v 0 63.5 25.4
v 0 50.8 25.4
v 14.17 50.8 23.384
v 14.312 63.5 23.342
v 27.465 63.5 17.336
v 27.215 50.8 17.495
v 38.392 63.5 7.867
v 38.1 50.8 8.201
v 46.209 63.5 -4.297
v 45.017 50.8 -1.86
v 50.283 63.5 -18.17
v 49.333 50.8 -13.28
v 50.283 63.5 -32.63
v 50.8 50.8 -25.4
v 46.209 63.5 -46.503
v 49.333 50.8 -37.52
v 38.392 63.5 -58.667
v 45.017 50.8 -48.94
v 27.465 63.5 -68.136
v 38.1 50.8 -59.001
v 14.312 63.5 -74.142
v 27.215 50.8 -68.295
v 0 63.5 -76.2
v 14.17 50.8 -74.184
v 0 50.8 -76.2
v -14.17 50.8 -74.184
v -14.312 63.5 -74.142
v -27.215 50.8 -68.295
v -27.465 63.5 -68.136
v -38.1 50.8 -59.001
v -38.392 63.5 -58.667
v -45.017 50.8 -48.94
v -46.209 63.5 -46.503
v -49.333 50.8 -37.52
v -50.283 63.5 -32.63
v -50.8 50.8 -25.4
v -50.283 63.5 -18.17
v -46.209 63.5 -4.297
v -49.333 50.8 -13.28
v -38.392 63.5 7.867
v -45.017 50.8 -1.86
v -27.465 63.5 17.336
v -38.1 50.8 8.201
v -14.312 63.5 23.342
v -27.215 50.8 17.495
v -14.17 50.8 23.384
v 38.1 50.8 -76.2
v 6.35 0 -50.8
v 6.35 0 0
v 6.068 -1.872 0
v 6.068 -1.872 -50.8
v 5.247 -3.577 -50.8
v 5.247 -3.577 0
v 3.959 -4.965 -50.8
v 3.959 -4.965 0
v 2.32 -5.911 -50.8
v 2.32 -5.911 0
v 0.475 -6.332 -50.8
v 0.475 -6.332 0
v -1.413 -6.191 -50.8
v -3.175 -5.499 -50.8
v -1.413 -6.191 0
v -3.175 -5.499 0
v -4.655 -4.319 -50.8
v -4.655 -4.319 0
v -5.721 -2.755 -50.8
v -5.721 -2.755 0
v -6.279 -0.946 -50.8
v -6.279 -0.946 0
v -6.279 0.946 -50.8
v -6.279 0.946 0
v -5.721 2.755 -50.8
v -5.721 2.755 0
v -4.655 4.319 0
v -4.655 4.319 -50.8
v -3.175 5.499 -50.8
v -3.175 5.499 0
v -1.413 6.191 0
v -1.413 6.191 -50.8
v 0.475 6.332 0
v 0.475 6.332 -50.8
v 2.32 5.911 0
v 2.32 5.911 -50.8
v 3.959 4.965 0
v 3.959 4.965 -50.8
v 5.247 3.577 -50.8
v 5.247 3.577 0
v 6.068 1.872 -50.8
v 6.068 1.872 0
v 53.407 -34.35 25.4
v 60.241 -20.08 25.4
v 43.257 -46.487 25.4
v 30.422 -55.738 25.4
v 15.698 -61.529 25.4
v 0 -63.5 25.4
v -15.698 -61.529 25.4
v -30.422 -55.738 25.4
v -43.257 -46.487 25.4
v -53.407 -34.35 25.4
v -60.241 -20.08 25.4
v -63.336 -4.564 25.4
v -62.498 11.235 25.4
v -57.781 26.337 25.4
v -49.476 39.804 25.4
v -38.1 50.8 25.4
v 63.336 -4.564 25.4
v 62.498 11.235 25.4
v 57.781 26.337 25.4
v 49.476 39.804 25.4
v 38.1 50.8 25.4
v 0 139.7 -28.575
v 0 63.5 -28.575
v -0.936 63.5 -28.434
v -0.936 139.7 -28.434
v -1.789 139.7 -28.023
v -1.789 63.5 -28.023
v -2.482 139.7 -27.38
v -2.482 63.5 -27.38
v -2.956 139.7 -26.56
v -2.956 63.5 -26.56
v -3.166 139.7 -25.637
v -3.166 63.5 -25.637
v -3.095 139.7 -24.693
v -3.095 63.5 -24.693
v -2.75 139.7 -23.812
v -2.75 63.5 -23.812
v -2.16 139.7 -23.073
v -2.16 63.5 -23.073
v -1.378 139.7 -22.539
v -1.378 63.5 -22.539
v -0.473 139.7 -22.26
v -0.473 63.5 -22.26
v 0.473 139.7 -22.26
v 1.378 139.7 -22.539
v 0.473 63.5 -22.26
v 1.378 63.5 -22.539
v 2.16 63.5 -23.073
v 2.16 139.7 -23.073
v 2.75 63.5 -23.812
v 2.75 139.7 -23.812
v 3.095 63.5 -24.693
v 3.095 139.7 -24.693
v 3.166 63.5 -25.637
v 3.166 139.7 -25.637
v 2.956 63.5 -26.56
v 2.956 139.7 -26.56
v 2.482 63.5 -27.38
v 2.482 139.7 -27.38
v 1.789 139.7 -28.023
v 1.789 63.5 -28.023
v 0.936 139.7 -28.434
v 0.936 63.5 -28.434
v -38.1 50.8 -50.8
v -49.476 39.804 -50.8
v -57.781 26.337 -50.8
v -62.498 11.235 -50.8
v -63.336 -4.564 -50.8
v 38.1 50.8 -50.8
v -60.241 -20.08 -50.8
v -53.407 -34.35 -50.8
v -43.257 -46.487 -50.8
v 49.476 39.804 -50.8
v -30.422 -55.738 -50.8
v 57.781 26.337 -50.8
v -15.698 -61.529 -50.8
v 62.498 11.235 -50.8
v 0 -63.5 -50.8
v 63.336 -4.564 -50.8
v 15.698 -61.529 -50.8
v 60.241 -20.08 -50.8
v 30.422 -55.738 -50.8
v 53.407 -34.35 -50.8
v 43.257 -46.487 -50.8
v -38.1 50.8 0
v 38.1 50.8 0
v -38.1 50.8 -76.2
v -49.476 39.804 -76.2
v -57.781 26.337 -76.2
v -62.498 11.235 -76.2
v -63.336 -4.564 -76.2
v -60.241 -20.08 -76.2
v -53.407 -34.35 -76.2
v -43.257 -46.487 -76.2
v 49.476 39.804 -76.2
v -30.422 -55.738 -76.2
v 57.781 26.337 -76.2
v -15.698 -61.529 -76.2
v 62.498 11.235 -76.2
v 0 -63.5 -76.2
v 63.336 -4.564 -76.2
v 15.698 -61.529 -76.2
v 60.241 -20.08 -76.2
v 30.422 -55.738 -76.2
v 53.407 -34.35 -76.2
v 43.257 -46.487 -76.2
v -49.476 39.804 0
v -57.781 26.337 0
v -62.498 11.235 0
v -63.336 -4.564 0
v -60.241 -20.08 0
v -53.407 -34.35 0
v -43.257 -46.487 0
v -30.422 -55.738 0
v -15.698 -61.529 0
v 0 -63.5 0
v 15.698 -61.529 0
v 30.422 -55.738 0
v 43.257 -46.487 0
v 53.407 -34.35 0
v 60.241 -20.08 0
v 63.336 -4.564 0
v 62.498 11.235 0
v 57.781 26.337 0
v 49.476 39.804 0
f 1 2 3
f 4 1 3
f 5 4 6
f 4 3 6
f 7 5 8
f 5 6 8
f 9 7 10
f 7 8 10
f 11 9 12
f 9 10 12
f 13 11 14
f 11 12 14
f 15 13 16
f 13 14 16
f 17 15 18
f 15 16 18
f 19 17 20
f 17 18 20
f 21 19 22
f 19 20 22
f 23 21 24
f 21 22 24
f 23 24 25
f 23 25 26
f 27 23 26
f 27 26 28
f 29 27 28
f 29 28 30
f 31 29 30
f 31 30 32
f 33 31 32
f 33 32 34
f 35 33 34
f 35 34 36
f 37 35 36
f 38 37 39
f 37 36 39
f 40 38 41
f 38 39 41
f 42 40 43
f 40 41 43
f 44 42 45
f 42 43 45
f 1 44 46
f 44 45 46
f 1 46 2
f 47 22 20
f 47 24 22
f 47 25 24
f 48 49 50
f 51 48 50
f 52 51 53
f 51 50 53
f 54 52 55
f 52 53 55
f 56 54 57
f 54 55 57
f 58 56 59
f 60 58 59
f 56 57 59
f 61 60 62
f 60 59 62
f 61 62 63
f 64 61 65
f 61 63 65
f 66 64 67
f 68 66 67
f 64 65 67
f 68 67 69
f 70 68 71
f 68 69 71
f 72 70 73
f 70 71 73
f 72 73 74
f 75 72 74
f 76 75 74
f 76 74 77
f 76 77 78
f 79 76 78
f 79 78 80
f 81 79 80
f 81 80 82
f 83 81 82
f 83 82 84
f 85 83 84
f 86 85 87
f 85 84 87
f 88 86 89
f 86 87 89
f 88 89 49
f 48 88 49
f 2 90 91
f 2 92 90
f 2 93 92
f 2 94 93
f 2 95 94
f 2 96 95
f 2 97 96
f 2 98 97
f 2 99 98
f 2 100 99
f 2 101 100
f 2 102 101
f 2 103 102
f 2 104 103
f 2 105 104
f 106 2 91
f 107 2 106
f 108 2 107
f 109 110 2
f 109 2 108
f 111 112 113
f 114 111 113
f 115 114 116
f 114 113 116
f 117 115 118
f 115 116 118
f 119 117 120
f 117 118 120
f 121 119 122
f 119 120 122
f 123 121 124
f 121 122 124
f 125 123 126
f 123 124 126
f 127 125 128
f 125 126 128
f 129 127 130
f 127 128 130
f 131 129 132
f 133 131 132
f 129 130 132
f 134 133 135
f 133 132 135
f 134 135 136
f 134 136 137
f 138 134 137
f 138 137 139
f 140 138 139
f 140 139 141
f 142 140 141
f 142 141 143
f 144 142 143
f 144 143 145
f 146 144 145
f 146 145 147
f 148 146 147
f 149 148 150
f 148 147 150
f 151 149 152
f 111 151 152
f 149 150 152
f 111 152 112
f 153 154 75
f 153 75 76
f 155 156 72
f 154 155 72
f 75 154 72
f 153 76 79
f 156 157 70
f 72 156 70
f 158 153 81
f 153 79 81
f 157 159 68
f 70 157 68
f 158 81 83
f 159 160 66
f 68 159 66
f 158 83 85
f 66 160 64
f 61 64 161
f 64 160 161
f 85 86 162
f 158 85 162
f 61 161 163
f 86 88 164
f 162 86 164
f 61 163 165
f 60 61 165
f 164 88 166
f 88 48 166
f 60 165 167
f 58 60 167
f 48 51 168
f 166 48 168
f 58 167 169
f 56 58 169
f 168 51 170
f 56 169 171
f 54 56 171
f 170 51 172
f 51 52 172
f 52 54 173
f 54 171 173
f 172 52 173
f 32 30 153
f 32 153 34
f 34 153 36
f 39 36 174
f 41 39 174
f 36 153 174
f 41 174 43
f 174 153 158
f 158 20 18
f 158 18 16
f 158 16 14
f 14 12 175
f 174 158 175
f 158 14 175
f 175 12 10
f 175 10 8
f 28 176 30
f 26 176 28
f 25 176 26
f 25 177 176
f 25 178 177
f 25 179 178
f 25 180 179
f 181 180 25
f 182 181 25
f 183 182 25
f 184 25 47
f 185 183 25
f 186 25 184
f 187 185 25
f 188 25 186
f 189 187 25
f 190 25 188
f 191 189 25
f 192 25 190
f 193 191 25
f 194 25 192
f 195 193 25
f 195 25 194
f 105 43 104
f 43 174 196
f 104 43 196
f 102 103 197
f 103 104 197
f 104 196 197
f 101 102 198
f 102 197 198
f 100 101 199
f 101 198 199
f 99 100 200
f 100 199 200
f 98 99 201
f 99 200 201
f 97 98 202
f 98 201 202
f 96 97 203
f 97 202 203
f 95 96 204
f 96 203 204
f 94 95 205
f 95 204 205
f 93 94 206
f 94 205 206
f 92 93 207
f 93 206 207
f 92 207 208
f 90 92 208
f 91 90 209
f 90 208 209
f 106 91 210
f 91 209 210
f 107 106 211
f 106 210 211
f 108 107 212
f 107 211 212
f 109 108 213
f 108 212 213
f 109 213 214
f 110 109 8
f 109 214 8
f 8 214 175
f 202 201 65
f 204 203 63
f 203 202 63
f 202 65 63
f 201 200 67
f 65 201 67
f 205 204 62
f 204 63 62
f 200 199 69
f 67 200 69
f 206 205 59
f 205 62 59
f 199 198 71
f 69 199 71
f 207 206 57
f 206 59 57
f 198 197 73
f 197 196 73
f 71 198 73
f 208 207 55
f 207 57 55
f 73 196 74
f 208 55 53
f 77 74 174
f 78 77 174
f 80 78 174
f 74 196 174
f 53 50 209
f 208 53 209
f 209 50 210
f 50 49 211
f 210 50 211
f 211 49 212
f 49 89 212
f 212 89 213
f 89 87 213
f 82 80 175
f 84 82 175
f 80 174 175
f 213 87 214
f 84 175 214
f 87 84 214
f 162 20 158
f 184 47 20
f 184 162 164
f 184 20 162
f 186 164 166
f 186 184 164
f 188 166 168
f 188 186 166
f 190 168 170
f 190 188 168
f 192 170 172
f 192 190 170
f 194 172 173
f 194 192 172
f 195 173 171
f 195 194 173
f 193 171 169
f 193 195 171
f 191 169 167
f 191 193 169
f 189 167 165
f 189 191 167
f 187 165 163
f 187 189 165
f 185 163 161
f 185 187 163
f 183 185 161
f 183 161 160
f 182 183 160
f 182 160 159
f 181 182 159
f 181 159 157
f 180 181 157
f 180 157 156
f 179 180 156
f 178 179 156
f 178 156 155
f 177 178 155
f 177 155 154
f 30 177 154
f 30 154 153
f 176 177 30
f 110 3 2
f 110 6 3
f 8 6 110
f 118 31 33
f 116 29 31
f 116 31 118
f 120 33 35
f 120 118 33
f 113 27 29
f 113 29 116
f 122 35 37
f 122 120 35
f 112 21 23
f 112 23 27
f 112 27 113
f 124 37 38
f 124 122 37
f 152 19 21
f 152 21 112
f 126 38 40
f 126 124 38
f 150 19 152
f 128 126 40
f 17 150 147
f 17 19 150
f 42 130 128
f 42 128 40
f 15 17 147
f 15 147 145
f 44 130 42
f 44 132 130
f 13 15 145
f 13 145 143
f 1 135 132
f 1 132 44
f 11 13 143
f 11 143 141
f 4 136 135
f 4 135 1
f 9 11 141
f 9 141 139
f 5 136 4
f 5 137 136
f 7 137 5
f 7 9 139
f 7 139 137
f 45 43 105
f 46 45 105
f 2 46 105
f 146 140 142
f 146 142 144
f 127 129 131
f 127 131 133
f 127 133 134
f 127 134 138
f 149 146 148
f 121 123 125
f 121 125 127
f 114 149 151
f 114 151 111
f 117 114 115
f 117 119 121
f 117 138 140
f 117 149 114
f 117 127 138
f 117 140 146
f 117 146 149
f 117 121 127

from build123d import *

# Parameters (mm, degrees)
SKETCH2_R           = 63.5
BOSS_EXTRUDE1_DEPTH = 25.4
SKETCH3_R           = 6.35
BOSS_EXTRUDE2_DEPTH = 50.8
BOSS_EXTRUDE3_START = 25.4
SKETCH4_R           = 63.5
BOSS_EXTRUDE3_DEPTH = 25.4
CUT_EXTRUDE1_START  = 76.2
SKETCH5_W           = 127
SKETCH5_H           = 101.6
CUT_EXTRUDE1_DEPTH  = 25.4
SKETCH6_R           = 50.8
BOSS_EXTRUDE4_DEPTH = 12.7
SKETCH7_R           = 3.175
BOSS_EXTRUDE5_DEPTH = 76.2


with BuildPart() as part:
    # Sketch2 → Boss-Extrude1 (new body)
    with BuildSketch(Plane.XY):
        Circle(SKETCH2_R)
    extrude(amount=BOSS_EXTRUDE1_DEPTH)

    # Sketch3 → Boss-Extrude2 (add)
    with BuildSketch(Plane(origin=(0, 0, 0), x_dir=(-1, 0, 0), z_dir=(0, 0, -1))):
        with Locations(Location((0, 0, 0), (0, 0, 180))):
            Circle(SKETCH3_R)
    extrude(amount=BOSS_EXTRUDE2_DEPTH)

    # Sketch4 → Boss-Extrude3 (add)
    with BuildSketch(Plane(origin=(0, 0, -50.8), x_dir=(-1, 0, 0), z_dir=(0, 0, -1)).offset(BOSS_EXTRUDE3_START)):
        with Locations(Location((0, 0, 0), (0, 0, 180))):
            Circle(SKETCH4_R)
    extrude(amount=-BOSS_EXTRUDE3_DEPTH)

    # Sketch5 → Cut-Extrude1 (cut)
    with BuildSketch(Plane(origin=(0, 0, 0), x_dir=(1, 0, 0), z_dir=(0, 1, 0)).offset(CUT_EXTRUDE1_START)):
        with Locations((0, 25.4)):
            Rectangle(SKETCH5_W, SKETCH5_H)
    extrude(amount=-CUT_EXTRUDE1_DEPTH, mode=Mode.SUBTRACT)

    # Sketch6 → Boss-Extrude4 (add)
    with BuildSketch(Plane(origin=(0, 50.8, 0), x_dir=(1, 0, 0), z_dir=(0, 1, 0))):
        with Locations(Location((0, 25.4, 0), (0, 0, 270))):
            Circle(SKETCH6_R)
    extrude(amount=BOSS_EXTRUDE4_DEPTH)

    # Sketch7 → Boss-Extrude5 (add)
    with BuildSketch(Plane(origin=(0, 63.5, 0), x_dir=(1, 0, 0), z_dir=(0, 1, 0))):
        with Locations(Location((0, 25.4, 0), (0, 0, 90))):
            Circle(SKETCH7_R)
    extrude(amount=BOSS_EXTRUDE5_DEPTH)


solid = part.part
